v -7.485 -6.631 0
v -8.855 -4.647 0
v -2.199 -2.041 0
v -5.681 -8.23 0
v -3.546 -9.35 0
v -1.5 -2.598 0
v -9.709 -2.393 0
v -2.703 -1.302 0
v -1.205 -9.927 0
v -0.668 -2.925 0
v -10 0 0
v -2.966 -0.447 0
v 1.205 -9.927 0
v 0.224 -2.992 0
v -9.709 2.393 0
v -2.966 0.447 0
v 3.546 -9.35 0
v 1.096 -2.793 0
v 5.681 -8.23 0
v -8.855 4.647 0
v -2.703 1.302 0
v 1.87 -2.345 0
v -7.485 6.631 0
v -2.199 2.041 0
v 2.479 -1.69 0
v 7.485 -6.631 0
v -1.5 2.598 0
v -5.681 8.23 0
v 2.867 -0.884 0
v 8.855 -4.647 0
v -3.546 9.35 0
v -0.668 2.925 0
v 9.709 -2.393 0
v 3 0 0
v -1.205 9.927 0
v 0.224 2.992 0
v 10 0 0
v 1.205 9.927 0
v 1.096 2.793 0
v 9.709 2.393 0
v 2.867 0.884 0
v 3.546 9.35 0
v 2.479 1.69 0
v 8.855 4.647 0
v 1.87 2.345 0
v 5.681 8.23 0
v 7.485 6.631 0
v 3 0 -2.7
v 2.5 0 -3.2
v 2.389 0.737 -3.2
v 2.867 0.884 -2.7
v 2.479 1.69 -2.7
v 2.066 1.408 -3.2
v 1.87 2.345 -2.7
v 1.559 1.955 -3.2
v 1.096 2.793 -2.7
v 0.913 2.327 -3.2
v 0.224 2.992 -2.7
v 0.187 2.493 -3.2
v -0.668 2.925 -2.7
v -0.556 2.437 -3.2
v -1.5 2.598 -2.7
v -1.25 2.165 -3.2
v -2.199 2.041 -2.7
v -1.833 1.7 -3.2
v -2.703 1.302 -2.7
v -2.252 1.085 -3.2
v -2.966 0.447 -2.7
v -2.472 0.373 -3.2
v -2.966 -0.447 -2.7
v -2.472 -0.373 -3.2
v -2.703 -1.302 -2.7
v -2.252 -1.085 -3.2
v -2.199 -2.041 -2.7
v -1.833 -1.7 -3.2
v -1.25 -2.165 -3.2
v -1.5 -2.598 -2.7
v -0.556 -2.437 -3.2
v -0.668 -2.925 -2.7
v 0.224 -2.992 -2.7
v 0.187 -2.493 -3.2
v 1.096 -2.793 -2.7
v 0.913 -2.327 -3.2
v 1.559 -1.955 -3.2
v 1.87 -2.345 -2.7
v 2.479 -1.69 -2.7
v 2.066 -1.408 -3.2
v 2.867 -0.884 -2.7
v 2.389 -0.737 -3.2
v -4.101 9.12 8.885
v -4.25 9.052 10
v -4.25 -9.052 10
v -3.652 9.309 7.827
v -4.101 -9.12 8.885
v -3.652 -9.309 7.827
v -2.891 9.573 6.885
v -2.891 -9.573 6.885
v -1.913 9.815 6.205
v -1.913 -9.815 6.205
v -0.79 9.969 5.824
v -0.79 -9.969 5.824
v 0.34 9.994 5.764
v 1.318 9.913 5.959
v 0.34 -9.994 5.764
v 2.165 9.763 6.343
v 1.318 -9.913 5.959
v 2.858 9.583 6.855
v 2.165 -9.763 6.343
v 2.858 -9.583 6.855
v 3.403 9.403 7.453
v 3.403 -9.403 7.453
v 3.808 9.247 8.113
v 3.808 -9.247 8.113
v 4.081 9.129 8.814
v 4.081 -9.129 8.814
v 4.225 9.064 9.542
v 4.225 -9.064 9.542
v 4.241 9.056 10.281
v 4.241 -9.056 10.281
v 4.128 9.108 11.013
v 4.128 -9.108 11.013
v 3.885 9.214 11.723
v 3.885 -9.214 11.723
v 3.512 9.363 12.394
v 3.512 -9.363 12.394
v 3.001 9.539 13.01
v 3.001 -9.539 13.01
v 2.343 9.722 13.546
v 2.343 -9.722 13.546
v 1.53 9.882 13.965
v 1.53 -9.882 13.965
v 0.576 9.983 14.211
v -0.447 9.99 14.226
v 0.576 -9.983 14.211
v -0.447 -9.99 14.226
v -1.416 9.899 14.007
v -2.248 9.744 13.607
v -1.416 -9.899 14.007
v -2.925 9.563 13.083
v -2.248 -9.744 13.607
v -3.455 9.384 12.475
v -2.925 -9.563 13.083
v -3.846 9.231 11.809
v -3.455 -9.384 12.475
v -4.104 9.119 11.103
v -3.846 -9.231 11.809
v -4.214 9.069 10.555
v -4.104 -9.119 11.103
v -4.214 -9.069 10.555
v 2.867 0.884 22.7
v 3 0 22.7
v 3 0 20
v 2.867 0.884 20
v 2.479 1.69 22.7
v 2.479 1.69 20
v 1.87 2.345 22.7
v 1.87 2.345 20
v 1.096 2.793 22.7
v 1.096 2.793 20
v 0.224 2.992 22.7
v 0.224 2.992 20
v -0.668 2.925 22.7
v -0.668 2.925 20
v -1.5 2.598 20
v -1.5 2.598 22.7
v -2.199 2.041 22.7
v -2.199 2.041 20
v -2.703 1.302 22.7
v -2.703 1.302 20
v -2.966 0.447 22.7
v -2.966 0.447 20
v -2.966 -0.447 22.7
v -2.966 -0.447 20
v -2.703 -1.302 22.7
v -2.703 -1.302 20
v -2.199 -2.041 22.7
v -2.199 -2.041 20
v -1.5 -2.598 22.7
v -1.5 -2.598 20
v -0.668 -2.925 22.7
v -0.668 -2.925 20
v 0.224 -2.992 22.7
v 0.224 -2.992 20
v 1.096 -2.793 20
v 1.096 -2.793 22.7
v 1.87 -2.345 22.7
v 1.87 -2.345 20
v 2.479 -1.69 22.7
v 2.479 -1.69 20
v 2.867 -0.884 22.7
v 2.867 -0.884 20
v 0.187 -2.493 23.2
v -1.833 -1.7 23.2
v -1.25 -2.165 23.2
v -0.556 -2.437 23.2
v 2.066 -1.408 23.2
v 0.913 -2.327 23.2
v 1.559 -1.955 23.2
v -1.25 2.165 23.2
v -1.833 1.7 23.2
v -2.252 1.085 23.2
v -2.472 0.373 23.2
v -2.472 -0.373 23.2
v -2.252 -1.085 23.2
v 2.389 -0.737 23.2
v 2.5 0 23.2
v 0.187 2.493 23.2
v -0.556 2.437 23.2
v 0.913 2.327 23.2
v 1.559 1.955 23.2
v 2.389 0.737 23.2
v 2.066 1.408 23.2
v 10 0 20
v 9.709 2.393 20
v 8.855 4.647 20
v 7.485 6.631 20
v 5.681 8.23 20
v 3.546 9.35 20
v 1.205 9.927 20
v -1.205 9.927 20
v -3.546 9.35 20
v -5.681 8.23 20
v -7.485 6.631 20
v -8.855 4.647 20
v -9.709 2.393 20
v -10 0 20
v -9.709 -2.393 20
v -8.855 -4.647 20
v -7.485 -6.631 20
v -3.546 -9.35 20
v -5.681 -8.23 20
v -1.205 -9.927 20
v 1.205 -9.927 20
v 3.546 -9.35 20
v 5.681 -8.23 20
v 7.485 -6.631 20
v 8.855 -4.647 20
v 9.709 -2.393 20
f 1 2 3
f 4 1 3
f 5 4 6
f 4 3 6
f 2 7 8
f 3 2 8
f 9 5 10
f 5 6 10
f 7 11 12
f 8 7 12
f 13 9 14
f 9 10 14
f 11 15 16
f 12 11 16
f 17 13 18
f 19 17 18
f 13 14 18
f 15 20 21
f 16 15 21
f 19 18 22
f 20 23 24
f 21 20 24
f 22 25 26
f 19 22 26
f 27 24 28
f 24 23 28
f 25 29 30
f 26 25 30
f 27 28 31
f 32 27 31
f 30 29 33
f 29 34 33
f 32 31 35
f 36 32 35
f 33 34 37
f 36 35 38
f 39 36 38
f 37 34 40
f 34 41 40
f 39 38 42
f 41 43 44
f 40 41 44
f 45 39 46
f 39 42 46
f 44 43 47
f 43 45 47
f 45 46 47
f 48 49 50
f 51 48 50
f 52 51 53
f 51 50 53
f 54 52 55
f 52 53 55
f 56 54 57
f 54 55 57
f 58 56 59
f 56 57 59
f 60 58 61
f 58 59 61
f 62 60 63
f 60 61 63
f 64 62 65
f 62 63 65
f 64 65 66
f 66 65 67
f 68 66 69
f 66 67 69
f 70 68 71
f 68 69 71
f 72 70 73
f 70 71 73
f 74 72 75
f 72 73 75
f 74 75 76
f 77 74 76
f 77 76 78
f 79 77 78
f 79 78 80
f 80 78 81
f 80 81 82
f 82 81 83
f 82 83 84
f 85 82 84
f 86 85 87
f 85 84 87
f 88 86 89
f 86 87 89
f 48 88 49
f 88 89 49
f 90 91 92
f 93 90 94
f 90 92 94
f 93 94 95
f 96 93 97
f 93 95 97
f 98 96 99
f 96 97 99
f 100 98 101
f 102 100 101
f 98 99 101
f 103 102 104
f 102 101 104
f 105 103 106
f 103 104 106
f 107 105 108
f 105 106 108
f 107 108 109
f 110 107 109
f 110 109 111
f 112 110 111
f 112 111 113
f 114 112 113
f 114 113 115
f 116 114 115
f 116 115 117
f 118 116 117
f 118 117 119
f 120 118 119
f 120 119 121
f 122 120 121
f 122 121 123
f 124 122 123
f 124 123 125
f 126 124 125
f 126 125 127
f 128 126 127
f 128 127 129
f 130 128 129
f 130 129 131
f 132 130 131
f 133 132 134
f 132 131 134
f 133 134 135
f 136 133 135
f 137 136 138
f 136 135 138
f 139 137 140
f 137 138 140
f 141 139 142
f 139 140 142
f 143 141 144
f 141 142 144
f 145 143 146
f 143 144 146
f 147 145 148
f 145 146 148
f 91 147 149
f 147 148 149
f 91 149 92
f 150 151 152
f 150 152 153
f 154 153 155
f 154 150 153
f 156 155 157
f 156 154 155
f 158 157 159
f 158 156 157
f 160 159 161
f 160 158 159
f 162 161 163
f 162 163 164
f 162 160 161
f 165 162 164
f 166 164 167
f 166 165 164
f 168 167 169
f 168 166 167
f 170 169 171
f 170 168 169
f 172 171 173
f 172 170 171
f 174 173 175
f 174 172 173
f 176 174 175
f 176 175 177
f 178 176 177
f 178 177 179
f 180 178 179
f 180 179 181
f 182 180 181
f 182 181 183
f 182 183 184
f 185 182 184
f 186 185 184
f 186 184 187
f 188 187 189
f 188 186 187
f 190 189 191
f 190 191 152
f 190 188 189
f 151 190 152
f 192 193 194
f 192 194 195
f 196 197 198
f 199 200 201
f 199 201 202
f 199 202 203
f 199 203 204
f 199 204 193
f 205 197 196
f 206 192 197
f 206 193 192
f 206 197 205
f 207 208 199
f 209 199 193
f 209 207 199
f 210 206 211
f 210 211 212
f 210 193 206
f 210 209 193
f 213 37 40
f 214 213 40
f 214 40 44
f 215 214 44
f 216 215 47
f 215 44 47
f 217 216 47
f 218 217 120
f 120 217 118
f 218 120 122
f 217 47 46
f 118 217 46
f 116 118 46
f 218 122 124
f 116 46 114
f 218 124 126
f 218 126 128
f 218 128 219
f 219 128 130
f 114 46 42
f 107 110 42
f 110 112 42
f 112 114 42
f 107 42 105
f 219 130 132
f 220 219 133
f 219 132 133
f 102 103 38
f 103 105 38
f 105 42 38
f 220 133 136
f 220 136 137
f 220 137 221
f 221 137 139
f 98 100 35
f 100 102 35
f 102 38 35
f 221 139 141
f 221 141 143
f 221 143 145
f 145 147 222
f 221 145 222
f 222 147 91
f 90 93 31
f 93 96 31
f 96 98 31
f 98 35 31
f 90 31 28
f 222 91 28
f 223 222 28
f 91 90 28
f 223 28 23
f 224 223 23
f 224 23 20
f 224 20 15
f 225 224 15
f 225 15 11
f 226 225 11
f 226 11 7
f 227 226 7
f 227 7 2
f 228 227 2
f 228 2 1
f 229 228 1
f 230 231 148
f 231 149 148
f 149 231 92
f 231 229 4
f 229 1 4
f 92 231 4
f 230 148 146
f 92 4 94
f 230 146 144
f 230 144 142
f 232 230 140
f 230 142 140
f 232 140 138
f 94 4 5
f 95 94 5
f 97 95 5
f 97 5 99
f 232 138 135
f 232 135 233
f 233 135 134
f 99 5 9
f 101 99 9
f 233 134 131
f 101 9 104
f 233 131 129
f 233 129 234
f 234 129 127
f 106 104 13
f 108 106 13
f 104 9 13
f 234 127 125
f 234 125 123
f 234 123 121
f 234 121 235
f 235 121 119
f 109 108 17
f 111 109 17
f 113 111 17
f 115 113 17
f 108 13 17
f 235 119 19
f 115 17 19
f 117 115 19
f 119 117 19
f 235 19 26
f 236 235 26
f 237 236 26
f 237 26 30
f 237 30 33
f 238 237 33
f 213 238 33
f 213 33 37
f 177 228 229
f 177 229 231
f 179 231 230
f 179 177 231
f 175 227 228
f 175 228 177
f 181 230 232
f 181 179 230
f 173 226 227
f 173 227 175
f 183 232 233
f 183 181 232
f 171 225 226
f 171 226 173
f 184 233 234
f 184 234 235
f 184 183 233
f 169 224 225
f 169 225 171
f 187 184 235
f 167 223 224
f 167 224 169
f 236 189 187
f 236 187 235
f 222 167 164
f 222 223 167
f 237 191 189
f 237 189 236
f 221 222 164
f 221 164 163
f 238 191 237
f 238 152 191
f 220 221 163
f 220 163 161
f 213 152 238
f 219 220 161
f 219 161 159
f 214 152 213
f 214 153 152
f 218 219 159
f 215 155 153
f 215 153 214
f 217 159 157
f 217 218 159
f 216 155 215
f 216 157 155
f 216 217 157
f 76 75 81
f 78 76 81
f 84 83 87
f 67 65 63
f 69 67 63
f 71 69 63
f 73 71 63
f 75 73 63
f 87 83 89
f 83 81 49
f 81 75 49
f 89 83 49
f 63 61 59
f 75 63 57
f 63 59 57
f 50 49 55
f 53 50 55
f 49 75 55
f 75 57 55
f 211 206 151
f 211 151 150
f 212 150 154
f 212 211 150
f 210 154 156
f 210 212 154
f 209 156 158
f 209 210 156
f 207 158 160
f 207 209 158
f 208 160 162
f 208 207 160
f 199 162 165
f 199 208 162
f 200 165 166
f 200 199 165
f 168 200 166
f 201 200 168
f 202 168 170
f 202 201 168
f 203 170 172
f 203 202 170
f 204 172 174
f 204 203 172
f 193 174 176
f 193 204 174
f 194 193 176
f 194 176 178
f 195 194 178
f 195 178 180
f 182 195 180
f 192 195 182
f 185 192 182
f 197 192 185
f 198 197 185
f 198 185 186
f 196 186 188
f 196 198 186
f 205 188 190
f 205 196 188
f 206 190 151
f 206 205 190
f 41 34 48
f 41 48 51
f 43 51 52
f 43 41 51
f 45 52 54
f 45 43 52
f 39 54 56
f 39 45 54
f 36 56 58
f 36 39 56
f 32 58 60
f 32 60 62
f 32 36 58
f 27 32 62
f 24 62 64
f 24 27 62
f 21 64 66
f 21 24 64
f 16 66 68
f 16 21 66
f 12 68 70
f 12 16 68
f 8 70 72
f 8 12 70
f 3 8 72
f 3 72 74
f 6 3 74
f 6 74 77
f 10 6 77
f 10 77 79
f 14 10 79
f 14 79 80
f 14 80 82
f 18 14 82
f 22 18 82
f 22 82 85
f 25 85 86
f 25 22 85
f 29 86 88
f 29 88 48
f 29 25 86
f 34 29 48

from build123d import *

# Parameters (mm, degrees)
SCHIZZO1_R                   = 10
ESTRUSIONE_ESTRUSIONE1_DEPTH = 20
SCHIZZO2_R                   = 3
ESTRUSIONE_ESTRUSIONE2_DEPTH = 13.2
SMUSSO1_SIZE                 = 0.5
FORO_FILETTATO_M10_3_D       = 8.5


with BuildPart() as part:
    # Schizzo1 → Estrusione-Estrusione1 (new body)
    with BuildSketch(Plane.XY):
        Circle(SCHIZZO1_R)
    extrude(amount=ESTRUSIONE_ESTRUSIONE1_DEPTH)

    # Schizzo2 → Estrusione-Estrusione2 (add, symmetric)
    with BuildSketch(Plane.XY.offset(10)):
        Circle(SCHIZZO2_R)
    extrude(amount=ESTRUSIONE_ESTRUSIONE2_DEPTH, both=True)

    # Smusso1
    smusso1_edges = [part.edges().sort_by_distance(p)[0] for p in [
        (-3, 0, -3.2),
        (-3, 0, 23.2),
    ]]
    chamfer(smusso1_edges, length=SMUSSO1_SIZE)

    # Foro filettato M10-3 (through all)
    with Locations(Plane(origin=(0, 10, 10), x_dir=(1, 0, 0), z_dir=(0, 1, 0))):
        with Locations((0, 0)):
            Hole(FORO_FILETTATO_M10_3_D / 2)


solid = part.part
